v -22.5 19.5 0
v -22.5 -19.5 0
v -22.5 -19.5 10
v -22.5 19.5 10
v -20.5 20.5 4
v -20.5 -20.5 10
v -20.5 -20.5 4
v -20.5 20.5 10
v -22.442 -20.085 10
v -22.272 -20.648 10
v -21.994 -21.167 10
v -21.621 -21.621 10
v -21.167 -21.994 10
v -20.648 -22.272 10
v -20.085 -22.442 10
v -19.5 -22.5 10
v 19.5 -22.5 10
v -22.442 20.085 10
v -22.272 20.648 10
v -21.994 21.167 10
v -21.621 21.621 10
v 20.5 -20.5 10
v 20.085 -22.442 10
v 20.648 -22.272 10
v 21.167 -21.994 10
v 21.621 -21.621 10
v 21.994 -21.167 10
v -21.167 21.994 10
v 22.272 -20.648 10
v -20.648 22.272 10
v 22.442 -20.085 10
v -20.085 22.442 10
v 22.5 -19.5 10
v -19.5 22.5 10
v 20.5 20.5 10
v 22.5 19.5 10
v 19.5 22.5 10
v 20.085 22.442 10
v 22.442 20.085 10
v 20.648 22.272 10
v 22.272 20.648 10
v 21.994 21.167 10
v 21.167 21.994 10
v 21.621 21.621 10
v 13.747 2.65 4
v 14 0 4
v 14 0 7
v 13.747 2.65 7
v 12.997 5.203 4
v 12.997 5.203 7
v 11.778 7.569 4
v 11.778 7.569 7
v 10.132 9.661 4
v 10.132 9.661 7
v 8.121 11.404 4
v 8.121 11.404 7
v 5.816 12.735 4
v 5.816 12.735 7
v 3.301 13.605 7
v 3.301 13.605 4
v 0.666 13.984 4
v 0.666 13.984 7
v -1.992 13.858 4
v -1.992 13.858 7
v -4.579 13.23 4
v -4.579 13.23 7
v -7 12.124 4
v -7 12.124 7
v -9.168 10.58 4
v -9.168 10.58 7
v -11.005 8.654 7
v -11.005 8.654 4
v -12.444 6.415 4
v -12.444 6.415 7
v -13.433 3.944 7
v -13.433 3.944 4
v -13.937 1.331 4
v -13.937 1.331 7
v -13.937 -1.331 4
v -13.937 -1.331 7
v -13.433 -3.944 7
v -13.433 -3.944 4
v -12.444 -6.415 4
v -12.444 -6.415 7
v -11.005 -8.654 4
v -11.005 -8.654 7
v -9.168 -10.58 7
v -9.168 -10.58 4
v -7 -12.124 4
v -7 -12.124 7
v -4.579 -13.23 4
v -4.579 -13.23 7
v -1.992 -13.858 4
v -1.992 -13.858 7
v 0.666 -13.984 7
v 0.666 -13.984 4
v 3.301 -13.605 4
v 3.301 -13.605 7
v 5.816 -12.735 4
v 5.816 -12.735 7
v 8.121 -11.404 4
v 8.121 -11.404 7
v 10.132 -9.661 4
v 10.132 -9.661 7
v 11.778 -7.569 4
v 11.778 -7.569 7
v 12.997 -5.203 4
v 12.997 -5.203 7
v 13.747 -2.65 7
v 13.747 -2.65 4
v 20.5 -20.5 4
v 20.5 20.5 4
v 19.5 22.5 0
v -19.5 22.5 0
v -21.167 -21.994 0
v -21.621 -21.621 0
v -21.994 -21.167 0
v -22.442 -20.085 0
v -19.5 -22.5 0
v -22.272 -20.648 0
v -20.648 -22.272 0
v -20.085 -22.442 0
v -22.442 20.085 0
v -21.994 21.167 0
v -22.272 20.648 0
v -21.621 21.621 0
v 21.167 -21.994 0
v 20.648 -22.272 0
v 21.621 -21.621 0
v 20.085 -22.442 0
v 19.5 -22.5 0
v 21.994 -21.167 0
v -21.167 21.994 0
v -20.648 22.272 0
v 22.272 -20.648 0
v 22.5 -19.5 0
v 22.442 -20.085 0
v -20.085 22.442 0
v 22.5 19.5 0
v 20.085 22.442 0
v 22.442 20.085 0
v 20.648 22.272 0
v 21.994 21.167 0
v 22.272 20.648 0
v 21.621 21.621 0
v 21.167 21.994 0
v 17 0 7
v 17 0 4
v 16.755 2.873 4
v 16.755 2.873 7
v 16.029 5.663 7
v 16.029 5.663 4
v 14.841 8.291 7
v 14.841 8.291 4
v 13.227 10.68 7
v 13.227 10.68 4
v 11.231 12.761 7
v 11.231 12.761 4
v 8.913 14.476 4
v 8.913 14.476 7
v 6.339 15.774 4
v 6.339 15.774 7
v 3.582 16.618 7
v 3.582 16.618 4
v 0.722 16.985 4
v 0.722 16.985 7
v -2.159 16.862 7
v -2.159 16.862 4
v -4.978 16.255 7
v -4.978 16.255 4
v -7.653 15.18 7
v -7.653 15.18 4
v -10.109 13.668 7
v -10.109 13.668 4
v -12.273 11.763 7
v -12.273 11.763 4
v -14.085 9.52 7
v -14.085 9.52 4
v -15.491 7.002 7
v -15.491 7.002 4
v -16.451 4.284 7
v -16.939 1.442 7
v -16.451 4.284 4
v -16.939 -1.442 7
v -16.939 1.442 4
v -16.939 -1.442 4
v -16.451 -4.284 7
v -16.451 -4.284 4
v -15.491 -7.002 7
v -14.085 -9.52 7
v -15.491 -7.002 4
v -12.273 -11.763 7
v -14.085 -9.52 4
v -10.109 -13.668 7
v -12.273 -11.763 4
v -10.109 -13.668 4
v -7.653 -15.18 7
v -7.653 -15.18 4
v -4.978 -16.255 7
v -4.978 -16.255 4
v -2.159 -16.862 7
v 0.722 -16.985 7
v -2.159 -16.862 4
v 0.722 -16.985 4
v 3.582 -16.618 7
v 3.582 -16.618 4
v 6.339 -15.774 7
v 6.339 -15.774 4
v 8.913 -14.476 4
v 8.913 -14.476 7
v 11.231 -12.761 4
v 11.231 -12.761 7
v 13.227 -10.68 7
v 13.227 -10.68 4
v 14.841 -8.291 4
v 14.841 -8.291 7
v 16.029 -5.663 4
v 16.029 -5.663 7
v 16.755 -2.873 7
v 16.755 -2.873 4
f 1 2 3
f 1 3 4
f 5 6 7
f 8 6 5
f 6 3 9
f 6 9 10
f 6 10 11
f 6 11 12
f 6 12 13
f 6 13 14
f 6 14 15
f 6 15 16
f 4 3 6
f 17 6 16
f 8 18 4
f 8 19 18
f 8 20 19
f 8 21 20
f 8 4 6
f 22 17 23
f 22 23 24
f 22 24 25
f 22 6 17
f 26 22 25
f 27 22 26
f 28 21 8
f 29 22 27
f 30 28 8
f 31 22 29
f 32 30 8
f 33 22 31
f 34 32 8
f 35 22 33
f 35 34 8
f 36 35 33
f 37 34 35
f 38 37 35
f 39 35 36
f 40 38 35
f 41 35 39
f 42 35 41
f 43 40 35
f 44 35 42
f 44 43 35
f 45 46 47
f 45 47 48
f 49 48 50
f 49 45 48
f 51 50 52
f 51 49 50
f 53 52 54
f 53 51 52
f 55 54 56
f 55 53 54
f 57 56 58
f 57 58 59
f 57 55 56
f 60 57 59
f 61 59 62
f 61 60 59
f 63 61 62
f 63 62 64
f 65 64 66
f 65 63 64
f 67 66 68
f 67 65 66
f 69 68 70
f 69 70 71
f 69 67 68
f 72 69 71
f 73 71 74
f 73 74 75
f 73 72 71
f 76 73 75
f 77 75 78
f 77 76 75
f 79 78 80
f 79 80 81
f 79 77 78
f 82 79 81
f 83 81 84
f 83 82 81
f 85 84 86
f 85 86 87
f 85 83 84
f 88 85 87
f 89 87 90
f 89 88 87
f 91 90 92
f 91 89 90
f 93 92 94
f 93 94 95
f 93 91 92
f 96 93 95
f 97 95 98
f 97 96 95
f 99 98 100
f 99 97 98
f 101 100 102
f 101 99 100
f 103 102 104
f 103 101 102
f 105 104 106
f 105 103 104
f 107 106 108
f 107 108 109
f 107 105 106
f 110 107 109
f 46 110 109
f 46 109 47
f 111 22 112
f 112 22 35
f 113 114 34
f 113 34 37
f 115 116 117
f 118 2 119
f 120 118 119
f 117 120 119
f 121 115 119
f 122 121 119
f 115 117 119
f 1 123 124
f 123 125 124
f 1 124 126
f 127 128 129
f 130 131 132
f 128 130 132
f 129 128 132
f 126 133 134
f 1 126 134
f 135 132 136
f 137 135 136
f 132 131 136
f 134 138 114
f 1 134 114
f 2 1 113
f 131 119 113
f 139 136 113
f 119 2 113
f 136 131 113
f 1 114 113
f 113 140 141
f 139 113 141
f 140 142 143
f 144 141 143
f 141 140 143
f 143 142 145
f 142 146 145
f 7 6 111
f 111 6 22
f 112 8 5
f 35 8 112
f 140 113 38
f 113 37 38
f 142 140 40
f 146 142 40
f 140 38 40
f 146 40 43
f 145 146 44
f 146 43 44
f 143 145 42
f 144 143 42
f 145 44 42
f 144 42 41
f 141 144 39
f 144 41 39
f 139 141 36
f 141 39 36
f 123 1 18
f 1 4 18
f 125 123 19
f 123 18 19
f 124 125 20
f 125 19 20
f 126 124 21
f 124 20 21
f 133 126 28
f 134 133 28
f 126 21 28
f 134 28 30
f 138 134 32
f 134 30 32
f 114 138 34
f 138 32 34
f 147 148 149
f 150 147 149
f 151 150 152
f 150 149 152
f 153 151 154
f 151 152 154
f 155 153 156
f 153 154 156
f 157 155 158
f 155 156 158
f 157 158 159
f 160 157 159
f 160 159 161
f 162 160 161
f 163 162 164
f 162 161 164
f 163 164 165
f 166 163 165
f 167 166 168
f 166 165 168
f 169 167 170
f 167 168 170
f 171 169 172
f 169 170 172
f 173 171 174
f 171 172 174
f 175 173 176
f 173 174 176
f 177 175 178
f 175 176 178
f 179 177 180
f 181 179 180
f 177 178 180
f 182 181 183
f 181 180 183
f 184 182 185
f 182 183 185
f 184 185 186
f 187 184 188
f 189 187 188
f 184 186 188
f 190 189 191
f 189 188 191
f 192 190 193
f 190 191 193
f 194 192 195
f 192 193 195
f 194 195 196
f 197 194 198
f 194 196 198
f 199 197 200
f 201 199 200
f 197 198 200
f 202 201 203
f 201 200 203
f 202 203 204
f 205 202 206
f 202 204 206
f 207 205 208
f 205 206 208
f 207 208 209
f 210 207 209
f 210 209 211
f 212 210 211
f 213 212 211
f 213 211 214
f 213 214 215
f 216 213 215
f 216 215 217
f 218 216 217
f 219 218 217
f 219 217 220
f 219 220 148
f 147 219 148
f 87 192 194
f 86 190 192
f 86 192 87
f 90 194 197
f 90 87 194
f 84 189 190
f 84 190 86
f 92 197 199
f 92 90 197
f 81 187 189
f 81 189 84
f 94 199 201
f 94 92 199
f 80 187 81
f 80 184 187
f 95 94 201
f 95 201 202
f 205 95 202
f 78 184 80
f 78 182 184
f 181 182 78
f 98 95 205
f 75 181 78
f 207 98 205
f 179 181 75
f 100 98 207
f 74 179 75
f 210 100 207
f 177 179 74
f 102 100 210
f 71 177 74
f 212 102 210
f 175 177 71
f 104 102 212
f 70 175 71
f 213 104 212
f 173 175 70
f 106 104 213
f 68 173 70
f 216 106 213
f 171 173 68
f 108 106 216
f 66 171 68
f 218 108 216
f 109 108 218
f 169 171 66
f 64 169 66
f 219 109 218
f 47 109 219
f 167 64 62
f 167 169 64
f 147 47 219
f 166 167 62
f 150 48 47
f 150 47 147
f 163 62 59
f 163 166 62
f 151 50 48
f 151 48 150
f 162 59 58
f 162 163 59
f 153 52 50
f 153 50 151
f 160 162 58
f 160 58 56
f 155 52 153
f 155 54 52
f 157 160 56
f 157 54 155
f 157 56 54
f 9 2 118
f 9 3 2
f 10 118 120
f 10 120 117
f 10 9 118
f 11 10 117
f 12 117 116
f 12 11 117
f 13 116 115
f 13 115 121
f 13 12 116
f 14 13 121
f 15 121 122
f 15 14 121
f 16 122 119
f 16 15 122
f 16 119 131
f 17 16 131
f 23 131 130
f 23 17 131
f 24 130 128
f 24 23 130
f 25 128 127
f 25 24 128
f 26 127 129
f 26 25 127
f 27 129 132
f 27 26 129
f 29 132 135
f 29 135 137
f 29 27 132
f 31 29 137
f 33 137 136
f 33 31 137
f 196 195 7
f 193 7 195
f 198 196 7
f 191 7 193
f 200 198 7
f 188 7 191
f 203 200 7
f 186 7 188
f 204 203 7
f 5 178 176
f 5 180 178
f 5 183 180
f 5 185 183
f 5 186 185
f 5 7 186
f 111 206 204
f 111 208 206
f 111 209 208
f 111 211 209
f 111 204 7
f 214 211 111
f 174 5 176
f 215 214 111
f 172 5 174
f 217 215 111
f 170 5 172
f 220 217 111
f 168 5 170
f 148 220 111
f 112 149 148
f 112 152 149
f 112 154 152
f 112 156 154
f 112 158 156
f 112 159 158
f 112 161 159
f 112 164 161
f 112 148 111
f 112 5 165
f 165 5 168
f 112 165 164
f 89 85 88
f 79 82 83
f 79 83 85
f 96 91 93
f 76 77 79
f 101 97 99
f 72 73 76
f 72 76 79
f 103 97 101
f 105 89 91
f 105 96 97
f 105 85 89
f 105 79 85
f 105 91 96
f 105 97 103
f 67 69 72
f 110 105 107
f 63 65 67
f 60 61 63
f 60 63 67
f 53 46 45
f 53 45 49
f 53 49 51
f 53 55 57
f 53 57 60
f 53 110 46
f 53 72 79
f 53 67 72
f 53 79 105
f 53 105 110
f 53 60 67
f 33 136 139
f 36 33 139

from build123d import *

# Parameters (mm, degrees)
SKETCH1_W           = 45
SKETCH1_H           = 45
BOSS_EXTRUDE1_DEPTH = 10
SKETCH2_W           = 41
SKETCH2_H           = 41
CUT_EXTRUDE1_DEPTH  = 6
SKETCH3_R           = 17
SKETCH3_R_2         = 14
BOSS_EXTRUDE2_DEPTH = 3
FILLET2_R           = 3


with BuildPart() as part:
    # Sketch1 → Boss-Extrude1 (new body)
    with BuildSketch(Plane.XY):
        Rectangle(SKETCH1_W, SKETCH1_H)
    extrude(amount=BOSS_EXTRUDE1_DEPTH)

    # Sketch2 → Cut-Extrude1 (cut)
    with BuildSketch(Plane.XY.offset(10)):
        Rectangle(SKETCH2_W, SKETCH2_H)
    extrude(amount=-CUT_EXTRUDE1_DEPTH, mode=Mode.SUBTRACT)

    # Sketch3 → Boss-Extrude2 (add)
    with BuildSketch(Plane.XY.offset(4)):
        Circle(SKETCH3_R)
        Circle(SKETCH3_R_2, mode=Mode.SUBTRACT)
    extrude(amount=BOSS_EXTRUDE2_DEPTH)

    # Fillet2
    fillet2_edges = [part.edges().sort_by_distance(p)[0] for p in [
        (-22.5, 22.5, 5),
        (22.5, 22.5, 5),
        (22.5, -22.5, 5),
        (-22.5, -22.5, 5),
    ]]
    fillet(fillet2_edges, radius=FILLET2_R)


solid = part.part
